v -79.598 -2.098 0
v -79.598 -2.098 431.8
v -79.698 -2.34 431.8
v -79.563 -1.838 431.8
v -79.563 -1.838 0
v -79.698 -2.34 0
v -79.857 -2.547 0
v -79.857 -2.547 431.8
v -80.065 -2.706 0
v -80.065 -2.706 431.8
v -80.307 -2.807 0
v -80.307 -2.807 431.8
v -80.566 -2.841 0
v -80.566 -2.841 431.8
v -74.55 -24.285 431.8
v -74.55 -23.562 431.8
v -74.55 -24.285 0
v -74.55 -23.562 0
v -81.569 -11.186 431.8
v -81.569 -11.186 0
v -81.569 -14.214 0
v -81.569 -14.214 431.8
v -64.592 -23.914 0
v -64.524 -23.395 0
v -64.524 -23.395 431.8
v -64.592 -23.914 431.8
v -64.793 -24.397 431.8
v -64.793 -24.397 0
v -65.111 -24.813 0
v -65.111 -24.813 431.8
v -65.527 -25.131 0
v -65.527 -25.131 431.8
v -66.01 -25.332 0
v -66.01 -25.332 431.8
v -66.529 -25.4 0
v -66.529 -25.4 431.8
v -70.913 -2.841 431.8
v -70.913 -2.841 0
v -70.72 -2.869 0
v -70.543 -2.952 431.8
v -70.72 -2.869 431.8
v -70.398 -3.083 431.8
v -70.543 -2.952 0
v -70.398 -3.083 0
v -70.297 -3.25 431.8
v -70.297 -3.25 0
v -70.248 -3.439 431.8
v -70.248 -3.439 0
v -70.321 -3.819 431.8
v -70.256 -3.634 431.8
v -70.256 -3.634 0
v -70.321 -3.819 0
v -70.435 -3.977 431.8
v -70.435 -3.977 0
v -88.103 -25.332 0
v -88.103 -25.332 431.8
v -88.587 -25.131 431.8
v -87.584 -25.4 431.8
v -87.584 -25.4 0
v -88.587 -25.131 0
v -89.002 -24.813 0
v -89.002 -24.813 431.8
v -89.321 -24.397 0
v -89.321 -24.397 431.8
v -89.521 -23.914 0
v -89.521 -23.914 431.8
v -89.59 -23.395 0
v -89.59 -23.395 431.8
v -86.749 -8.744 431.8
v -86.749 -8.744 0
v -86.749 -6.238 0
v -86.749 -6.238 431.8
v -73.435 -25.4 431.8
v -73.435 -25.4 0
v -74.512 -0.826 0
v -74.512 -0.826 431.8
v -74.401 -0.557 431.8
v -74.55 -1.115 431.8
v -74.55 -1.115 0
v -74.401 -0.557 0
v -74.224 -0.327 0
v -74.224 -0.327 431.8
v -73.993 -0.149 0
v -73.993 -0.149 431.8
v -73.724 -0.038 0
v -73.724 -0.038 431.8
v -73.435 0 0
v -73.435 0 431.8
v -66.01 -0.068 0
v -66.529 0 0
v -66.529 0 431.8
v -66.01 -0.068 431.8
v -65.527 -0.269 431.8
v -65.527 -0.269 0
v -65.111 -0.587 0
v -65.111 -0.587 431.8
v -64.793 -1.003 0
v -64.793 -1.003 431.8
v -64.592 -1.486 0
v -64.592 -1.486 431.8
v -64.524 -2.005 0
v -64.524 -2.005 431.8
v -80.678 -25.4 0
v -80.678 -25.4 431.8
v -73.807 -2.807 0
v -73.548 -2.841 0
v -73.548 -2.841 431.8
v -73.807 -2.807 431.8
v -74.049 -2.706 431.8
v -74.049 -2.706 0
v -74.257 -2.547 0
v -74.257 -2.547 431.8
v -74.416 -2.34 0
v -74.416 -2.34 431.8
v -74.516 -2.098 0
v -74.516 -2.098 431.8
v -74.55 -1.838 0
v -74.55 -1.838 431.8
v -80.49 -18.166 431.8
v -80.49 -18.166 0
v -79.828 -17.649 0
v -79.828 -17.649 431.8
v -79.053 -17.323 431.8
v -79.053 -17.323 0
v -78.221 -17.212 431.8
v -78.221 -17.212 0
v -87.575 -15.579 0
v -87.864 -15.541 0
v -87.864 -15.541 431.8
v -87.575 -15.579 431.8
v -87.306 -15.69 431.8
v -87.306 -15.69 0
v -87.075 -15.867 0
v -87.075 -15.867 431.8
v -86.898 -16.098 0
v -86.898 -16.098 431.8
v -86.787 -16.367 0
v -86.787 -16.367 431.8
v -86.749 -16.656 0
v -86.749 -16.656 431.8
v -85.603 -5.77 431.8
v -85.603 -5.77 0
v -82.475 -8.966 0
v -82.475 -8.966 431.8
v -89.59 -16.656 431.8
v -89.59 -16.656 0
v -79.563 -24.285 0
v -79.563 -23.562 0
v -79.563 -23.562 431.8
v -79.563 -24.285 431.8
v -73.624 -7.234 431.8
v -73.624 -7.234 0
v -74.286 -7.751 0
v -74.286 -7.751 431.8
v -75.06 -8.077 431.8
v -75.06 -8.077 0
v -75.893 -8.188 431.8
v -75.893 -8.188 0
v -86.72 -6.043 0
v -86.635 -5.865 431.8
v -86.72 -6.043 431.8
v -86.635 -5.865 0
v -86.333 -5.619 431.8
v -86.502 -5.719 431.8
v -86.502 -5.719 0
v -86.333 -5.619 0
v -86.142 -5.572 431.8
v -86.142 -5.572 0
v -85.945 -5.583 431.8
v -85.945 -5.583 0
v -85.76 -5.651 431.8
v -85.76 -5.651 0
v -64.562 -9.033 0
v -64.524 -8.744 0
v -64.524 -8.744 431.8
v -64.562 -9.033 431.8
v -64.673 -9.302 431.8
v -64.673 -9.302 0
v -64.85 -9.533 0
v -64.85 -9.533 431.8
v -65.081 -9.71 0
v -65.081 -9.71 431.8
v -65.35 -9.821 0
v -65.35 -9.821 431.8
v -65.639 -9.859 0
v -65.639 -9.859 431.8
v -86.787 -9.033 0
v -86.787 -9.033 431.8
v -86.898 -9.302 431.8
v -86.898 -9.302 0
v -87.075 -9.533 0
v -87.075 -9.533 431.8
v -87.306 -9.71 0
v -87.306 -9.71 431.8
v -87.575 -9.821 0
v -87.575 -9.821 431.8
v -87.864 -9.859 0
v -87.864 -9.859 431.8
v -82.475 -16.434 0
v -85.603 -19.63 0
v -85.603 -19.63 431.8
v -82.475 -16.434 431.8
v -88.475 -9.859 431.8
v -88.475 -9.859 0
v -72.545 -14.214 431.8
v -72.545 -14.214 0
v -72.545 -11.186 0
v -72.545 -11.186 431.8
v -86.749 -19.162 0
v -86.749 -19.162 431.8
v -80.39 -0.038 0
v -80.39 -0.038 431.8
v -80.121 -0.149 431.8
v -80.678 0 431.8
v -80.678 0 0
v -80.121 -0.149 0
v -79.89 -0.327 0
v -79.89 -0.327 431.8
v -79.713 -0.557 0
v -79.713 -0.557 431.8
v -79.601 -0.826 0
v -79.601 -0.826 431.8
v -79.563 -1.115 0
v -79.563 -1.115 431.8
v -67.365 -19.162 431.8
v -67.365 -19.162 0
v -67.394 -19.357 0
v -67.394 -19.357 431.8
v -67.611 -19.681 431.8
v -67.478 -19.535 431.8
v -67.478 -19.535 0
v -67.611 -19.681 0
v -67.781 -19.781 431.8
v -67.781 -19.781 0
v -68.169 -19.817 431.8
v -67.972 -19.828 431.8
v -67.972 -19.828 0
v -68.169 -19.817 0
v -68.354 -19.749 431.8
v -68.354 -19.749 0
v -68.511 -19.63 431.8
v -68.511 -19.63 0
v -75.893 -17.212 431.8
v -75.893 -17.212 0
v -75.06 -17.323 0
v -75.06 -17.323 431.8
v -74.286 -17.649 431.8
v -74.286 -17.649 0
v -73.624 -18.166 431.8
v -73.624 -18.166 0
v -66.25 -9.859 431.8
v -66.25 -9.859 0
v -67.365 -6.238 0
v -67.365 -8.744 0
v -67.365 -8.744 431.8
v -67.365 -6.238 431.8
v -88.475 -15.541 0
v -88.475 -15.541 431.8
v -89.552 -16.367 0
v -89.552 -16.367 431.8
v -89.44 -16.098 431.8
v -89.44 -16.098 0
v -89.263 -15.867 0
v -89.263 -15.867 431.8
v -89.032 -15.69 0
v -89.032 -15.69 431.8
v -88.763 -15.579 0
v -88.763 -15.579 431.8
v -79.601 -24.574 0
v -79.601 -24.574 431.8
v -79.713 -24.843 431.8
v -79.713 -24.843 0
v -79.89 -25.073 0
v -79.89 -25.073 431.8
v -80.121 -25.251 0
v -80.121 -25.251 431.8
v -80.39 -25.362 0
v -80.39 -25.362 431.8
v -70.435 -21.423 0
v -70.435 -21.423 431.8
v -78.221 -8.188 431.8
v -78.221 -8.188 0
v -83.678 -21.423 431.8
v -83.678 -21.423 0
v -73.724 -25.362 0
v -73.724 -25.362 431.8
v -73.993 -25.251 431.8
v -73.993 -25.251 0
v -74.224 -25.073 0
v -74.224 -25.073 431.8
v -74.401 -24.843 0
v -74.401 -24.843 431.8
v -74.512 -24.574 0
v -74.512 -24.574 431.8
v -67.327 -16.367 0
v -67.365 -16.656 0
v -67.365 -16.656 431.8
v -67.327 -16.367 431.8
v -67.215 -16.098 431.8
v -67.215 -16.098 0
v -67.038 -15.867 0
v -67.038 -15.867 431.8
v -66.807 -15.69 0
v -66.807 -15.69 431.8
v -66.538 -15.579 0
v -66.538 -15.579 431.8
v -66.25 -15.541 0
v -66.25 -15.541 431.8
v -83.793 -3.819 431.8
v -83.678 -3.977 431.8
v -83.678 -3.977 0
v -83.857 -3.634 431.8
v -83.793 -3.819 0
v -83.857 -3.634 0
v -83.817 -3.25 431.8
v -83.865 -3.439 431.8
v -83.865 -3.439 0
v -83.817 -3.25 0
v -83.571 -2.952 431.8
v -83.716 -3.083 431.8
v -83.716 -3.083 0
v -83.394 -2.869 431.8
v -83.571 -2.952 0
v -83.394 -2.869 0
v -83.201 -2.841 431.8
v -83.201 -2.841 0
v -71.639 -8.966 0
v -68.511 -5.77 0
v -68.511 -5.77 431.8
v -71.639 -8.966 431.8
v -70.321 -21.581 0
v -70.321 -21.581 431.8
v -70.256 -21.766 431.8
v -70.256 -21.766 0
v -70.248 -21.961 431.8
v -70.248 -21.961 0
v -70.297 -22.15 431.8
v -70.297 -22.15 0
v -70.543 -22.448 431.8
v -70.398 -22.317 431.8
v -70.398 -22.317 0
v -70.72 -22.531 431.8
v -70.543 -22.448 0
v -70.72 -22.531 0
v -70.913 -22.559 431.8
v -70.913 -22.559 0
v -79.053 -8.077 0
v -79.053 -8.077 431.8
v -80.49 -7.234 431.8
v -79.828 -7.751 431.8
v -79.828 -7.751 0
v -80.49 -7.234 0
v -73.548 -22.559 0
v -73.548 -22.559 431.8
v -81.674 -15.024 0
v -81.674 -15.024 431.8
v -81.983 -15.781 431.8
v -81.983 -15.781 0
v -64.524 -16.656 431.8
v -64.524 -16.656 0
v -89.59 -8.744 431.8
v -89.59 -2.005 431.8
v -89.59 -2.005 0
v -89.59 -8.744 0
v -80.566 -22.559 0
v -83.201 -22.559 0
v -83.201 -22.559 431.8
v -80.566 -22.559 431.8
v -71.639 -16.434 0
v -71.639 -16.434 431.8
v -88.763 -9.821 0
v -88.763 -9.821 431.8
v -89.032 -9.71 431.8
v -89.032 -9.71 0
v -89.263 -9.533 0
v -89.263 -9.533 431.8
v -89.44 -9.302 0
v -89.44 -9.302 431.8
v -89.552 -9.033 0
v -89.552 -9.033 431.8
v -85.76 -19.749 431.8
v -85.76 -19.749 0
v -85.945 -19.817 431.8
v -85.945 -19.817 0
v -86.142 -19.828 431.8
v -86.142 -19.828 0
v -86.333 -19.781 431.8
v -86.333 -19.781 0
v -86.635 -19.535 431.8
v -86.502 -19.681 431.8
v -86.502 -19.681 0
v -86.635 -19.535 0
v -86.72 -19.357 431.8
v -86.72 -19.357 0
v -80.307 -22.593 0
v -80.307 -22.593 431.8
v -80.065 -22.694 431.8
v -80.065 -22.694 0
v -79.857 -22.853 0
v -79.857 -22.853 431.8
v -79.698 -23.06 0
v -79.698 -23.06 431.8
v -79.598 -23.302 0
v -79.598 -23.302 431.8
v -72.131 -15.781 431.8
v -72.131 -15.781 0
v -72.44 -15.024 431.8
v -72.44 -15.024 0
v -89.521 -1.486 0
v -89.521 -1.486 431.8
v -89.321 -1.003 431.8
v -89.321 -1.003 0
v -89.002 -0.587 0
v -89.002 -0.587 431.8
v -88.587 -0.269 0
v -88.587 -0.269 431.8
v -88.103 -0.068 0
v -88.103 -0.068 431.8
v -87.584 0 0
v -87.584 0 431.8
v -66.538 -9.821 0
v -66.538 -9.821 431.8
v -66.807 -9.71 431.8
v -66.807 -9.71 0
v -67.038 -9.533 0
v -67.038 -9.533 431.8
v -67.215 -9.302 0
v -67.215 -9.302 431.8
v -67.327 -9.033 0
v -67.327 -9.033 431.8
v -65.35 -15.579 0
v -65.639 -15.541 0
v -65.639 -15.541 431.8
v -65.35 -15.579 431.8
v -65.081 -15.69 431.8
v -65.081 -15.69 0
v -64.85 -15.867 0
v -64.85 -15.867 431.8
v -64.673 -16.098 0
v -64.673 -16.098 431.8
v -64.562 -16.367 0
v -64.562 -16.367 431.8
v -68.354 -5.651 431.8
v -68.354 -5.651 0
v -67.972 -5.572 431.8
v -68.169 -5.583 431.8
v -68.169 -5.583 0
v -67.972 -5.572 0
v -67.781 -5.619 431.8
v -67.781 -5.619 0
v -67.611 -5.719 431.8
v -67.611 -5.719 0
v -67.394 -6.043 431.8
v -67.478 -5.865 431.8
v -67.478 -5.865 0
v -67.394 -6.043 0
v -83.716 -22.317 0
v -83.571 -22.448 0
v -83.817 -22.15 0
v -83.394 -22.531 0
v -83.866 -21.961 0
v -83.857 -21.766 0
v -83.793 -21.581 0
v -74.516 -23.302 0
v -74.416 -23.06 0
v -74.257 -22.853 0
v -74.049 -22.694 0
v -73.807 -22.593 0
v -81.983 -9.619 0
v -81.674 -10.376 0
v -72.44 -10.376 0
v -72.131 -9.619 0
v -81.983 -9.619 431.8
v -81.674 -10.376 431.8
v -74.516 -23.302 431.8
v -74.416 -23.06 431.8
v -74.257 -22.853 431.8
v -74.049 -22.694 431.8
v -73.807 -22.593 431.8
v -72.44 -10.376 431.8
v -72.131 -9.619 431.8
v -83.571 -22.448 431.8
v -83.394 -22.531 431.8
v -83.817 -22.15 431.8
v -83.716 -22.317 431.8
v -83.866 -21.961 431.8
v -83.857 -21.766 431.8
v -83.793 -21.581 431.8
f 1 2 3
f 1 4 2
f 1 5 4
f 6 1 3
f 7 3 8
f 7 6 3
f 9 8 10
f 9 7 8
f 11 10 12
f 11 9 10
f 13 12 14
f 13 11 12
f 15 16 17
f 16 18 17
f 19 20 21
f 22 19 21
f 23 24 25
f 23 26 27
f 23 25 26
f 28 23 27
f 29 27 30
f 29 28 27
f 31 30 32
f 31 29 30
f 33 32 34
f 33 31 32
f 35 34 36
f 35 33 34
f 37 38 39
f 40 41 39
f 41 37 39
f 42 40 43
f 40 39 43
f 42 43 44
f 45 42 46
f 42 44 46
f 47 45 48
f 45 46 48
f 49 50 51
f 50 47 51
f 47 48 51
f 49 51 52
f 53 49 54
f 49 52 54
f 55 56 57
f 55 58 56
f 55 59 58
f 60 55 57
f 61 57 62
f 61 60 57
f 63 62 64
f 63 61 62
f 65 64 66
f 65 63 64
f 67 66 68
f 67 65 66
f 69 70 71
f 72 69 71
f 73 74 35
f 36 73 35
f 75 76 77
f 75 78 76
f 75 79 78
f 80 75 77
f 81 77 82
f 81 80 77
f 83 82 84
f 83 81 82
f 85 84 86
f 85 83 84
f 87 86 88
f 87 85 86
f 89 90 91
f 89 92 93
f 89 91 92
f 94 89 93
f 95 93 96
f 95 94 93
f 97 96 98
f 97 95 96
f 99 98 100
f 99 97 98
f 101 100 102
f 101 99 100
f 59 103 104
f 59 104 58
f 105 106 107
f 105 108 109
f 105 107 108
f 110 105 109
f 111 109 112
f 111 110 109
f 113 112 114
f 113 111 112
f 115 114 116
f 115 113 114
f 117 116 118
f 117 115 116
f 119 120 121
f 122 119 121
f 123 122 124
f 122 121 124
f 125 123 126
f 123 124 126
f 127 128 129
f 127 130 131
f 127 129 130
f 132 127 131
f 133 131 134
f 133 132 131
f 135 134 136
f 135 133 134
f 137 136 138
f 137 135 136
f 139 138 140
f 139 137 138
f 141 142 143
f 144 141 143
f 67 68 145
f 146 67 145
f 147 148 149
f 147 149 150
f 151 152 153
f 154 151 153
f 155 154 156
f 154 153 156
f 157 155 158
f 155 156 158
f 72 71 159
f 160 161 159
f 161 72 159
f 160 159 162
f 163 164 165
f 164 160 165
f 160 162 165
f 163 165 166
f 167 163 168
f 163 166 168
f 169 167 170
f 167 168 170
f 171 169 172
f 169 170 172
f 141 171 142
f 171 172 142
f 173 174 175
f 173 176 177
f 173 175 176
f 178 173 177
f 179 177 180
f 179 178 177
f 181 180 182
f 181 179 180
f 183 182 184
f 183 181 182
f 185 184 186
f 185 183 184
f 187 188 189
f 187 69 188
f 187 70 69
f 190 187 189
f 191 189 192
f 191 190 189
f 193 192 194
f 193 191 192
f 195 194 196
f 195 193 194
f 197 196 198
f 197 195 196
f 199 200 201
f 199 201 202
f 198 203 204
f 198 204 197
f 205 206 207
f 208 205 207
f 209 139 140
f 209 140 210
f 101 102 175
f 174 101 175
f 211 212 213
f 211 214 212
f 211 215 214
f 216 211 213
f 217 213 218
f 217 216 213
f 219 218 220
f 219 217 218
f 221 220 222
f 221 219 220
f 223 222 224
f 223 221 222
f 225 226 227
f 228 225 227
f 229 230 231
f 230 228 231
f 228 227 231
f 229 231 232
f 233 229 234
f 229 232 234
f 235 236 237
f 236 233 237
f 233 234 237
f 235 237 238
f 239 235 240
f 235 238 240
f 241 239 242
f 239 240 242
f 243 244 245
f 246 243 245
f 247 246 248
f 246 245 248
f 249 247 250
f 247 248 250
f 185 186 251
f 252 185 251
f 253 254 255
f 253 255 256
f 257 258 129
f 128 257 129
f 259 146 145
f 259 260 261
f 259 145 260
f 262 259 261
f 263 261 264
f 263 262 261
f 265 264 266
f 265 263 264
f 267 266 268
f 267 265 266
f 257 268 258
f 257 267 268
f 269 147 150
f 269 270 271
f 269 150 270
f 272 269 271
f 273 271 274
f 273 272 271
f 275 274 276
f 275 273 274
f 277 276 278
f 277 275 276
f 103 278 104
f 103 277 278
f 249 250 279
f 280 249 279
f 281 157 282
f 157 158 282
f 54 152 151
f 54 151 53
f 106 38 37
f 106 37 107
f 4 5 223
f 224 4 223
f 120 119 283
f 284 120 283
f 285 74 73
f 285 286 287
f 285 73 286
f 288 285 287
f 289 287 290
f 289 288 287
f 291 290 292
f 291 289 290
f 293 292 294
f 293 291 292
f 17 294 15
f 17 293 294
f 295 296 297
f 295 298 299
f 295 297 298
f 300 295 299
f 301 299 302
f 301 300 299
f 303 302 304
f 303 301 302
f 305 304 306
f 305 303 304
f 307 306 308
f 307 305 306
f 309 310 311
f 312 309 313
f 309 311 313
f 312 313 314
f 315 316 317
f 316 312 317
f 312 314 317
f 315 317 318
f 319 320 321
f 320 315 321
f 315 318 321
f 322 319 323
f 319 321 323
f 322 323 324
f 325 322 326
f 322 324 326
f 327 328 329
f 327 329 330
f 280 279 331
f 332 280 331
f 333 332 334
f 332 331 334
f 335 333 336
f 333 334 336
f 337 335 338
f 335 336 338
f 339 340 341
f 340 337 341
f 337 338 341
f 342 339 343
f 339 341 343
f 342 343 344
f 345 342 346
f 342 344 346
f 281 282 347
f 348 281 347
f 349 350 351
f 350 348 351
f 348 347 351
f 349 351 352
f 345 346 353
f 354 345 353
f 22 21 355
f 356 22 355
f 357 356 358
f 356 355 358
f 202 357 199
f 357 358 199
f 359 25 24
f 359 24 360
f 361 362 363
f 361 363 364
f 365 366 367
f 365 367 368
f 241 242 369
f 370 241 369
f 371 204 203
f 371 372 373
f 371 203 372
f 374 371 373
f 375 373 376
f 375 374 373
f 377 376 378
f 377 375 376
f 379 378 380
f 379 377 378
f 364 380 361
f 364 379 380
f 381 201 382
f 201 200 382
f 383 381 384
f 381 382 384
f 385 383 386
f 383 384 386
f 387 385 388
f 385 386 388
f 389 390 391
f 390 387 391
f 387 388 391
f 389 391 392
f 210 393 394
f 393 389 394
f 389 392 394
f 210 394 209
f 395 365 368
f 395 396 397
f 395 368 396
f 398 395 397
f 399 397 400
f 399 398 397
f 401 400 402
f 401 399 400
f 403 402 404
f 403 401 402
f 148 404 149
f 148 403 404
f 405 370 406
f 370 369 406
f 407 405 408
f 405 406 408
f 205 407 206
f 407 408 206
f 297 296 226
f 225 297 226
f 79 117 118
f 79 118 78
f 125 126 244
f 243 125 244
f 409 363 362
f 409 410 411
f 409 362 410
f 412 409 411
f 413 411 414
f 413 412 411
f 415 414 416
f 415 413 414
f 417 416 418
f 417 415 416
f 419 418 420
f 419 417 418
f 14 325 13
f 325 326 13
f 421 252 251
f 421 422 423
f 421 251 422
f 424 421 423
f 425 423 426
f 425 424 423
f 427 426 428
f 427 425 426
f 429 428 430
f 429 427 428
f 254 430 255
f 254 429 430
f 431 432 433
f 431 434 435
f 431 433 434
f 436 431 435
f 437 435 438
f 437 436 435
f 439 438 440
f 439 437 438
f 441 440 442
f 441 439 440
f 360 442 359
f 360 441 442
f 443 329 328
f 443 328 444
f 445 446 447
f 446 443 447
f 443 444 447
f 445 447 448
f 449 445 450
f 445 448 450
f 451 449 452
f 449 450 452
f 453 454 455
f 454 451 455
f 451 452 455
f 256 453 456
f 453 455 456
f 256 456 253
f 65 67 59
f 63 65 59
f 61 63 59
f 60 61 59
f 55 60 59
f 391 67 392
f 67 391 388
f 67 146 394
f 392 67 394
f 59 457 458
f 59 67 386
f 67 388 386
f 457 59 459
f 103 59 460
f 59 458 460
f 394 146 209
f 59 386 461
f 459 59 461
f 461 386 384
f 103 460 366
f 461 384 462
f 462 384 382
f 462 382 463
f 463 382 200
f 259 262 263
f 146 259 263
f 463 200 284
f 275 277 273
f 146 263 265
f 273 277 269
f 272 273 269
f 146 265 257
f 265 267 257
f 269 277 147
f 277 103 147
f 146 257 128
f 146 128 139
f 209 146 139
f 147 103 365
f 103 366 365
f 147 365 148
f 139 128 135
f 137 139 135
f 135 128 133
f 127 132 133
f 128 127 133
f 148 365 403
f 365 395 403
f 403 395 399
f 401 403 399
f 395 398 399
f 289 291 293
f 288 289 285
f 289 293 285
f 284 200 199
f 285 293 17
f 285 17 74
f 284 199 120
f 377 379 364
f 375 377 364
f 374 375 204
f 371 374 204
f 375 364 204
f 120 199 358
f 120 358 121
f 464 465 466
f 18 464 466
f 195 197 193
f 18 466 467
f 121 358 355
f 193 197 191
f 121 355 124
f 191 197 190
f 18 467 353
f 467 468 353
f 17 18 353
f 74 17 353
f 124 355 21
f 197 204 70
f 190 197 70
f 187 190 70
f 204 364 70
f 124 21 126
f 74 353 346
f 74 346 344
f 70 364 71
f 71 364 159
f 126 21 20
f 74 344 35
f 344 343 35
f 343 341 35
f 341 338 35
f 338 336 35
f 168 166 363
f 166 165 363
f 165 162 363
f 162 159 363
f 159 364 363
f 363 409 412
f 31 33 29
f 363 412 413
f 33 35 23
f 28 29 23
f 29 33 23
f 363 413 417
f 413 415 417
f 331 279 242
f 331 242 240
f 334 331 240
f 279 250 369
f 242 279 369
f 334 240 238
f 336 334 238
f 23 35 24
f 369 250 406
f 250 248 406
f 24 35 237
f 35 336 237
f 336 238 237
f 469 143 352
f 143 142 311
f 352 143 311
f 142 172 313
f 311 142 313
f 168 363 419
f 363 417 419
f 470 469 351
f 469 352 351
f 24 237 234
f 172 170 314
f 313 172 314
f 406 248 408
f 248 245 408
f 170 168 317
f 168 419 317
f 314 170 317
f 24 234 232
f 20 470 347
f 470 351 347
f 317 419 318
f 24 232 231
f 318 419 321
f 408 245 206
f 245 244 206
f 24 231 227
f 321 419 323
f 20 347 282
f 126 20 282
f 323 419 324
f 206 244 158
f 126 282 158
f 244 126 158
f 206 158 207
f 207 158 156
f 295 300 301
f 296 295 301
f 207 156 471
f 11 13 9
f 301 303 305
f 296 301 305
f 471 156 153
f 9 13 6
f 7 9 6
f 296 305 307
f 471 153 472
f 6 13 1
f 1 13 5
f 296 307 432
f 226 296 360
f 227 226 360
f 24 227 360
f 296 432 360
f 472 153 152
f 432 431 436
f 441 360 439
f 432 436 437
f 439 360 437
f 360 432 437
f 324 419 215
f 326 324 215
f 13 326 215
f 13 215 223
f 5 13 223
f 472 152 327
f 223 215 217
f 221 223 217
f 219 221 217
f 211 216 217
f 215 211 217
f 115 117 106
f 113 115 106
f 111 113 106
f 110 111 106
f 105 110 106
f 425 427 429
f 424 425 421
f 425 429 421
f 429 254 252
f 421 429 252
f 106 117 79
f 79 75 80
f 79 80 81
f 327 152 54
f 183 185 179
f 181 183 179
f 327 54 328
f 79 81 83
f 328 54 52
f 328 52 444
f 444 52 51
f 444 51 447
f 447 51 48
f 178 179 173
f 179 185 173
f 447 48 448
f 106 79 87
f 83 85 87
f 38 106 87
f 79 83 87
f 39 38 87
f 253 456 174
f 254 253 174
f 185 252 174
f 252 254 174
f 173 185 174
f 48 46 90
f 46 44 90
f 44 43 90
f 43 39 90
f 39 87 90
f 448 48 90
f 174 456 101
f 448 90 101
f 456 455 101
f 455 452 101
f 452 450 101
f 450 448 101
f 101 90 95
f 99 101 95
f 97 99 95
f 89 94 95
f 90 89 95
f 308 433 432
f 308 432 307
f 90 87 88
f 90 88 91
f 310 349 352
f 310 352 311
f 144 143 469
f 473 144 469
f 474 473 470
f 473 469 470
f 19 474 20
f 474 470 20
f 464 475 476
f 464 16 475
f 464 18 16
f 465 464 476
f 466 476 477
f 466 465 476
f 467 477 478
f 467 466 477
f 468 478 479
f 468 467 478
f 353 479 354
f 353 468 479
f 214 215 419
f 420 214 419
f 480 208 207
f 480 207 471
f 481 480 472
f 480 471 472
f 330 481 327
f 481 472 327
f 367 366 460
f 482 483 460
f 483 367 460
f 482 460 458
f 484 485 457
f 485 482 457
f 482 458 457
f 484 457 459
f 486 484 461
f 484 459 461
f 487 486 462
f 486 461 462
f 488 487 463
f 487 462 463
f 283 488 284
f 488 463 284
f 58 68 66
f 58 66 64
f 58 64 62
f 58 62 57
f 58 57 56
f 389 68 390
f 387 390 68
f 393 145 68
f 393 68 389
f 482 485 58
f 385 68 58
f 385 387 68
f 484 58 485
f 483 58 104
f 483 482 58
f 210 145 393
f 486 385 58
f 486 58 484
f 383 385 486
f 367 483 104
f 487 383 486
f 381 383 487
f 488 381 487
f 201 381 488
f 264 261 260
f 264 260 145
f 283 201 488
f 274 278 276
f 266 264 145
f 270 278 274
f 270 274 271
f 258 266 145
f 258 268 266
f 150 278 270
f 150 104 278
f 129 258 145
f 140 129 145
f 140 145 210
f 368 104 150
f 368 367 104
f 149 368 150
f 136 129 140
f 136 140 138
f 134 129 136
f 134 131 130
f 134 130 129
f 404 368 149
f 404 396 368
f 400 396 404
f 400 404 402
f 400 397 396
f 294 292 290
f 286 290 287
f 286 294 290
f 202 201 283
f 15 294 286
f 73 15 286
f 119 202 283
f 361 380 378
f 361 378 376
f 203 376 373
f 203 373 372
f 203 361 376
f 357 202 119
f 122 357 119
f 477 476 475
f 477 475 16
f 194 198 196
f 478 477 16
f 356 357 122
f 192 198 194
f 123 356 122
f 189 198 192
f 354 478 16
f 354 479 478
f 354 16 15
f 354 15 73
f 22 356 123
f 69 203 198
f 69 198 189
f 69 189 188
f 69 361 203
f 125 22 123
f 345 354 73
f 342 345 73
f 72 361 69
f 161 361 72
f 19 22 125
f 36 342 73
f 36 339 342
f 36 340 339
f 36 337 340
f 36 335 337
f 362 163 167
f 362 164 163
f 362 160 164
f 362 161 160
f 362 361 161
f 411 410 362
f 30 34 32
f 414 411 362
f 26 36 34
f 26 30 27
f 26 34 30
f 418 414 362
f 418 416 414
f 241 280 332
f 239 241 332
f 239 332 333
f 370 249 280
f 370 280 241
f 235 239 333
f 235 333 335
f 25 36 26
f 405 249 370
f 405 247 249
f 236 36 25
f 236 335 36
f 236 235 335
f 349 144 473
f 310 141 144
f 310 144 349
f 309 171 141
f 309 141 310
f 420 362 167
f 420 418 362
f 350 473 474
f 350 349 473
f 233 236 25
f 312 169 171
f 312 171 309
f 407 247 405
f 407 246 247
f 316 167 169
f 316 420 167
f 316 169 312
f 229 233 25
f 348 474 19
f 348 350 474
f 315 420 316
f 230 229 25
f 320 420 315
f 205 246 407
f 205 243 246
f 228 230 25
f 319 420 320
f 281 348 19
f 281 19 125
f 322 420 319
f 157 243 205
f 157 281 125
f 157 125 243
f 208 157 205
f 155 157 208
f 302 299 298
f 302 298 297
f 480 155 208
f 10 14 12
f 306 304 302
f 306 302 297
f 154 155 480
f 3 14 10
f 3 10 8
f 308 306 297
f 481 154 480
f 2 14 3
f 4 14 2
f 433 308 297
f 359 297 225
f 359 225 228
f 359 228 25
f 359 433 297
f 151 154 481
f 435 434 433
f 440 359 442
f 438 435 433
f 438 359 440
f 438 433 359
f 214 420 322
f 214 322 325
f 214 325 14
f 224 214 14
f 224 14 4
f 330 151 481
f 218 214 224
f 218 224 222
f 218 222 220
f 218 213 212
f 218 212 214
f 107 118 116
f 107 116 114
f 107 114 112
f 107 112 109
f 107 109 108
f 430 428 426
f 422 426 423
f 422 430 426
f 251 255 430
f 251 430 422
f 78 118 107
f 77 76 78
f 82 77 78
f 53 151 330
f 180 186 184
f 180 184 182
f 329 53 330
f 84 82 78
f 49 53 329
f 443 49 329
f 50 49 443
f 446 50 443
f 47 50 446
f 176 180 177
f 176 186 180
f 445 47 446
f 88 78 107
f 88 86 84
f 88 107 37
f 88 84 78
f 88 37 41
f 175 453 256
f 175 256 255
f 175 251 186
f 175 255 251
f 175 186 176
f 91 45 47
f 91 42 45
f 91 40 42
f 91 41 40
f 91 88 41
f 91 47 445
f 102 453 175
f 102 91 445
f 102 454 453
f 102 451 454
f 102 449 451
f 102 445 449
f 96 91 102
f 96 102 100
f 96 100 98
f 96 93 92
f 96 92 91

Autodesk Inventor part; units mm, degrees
ref_plane "YZ Plane" through (0, 0, 0) normal (1, 0, 0) x (0, 1, 0)
ref_plane "XZ Plane" through (0, 0, 0) normal (0, 1, 0) x (-1, 0, 0)
ref_plane "XY Plane" through (0, 0, 0) normal (0, 0, 1) x (1, 0, 0)
ref_plane "Work Plane1" through (-89.5775, 0, 0) normal (0, 0, 1) x (1, 0, 0)
sketch "Sketch1" plane through (-89.5775, 0, 0) normal (0, 0, 1) x (1, 0, 0)
  arc A0 (19.1422, -3.9768) -> (18.6646, -2.8408) centre (18.6646, -3.5092) ccw
  line L0 (15.9535, -7.2342) -> (19.1422, -3.9768)
  line L1 (21.0667, -5.7702) -> (17.9387, -8.9655)
  arc A1 (22.2128, -6.2377) -> (21.0667, -5.7702) centre (21.5444, -6.2377) ccw
  line L2 (25.0536, -2.0053) -> (25.0536, -8.7443)
  line L3 (22.2128, -8.7443) -> (22.2128, -6.2377)
  line L4 (-0.0122, -2.0053) -> (-0.0122, -8.7443)
  arc A2 (3.9747, -5.7702) -> (2.8286, -6.2377) centre (3.497, -6.2377) ccw
  arc A3 (1.9931, 0) -> (-0.0122, -2.0053) centre (1.9931, -2.0053) ccw
  line L5 (8.8992, 0) -> (1.9931, 0)
  arc A4 (7.1027, -16.4345) -> (8.0089, -14.2135) centre (4.8339, -14.2135) ccw
  arc A5 (18.6646, -22.5592) -> (19.1422, -21.4232) centre (18.6646, -21.8908) ccw
  line L6 (15.9535, -18.1658) -> (19.1422, -21.4232)
  arc A6 (21.0667, -19.6298) -> (22.2128, -19.1623) centre (21.5444, -19.1623) ccw
  line L7 (21.0667, -19.6298) -> (17.9387, -16.4345)
  line L8 (22.2128, -16.6557) -> (22.2128, -19.1623)
  line L9 (25.0536, -23.3947) -> (25.0536, -16.6557)
  line L10 (16.1422, 0) -> (23.0483, 0)
  line L11 (18.6646, -2.8408) -> (16.0299, -2.8408)
  arc A7 (22.2128, -8.7443) -> (23.3277, -9.8592) centre (23.3277, -8.7443) ccw
  line L12 (23.9387, -9.8592) -> (23.3277, -9.8592)
  arc A8 (23.9387, -9.8592) -> (25.0536, -8.7443) centre (23.9387, -8.7443) ccw
  arc A9 (6.3768, -2.8408) -> (5.8991, -3.9768) centre (6.3768, -3.5092) ccw
  line L13 (3.9747, -5.7702) -> (7.1027, -8.9655)
  line L14 (9.0879, -7.2342) -> (5.8991, -3.9768)
  arc A10 (2.8286, -19.1623) -> (3.9747, -19.6298) centre (3.497, -19.1623) ccw
  line L15 (-0.0122, -23.3947) -> (-0.0122, -16.6557)
  line L16 (3.9747, -19.6298) -> (7.1027, -16.4345)
  arc A11 (5.8991, -21.4232) -> (6.3768, -22.5592) centre (6.3768, -21.8908) ccw
  line L17 (9.0879, -18.1658) -> (5.8991, -21.4232)
  line L18 (2.8286, -16.6557) -> (2.8286, -19.1623)
  arc A12 (23.0483, -25.4) -> (25.0536, -23.3947) centre (23.0483, -23.3947) ccw
  arc A13 (25.0536, -2.0053) -> (23.0483, 0) centre (23.0483, -2.0053) ccw
  arc A14 (13.6846, -8.1882) -> (15.9535, -7.2342) centre (13.6846, -5.0132) ccw
  line L19 (13.6846, -8.1882) -> (11.3567, -8.1882)
  arc A15 (9.0115, -2.8408) -> (10.0141, -1.8382) centre (9.0115, -1.8382) ccw
  arc A16 (9.0879, -7.2342) -> (11.3567, -8.1882) centre (11.3567, -5.0132) ccw
  arc A17 (17.9387, -8.9655) -> (17.0325, -11.1865) centre (20.2075, -11.1865) ccw
  line L20 (17.0325, -14.2135) -> (17.0325, -11.1865)
  line L21 (6.3768, -2.8408) -> (9.0115, -2.8408)
  line L22 (10.0141, -1.8382) -> (10.0141, -1.1149)
  arc A18 (10.0141, -1.1149) -> (8.8992, 0) centre (8.8992, -1.1149) ccw
  line L23 (2.8286, -8.7443) -> (2.8286, -6.2377)
  arc A19 (1.7137, -9.8592) -> (2.8286, -8.7443) centre (1.7137, -8.7443) ccw
  line L24 (1.1027, -9.8592) -> (1.7137, -9.8592)
  arc A20 (-0.0122, -8.7443) -> (1.1027, -9.8592) centre (1.1027, -8.7443) ccw
  line L25 (6.3768, -22.5592) -> (9.0115, -22.5592)
  arc A21 (10.0141, -23.5618) -> (9.0115, -22.5592) centre (9.0115, -23.5618) ccw
  line L26 (10.0141, -23.5618) -> (10.0141, -24.2851)
  arc A22 (8.8992, -25.4) -> (10.0141, -24.2851) centre (8.8992, -24.2851) ccw
  line L27 (8.8992, -25.4) -> (1.9931, -25.4)
  arc A23 (17.0325, -14.2135) -> (17.9387, -16.4345) centre (20.2075, -14.2135) ccw
  line L28 (23.9387, -15.5408) -> (23.3277, -15.5408)
  arc A24 (23.3277, -15.5408) -> (22.2128, -16.6557) centre (23.3277, -16.6557) ccw
  arc A25 (25.0536, -16.6557) -> (23.9387, -15.5408) centre (23.9387, -16.6557) ccw
  line L29 (16.1422, -25.4) -> (23.0483, -25.4)
  line L30 (18.6646, -22.5592) -> (16.0299, -22.5592)
  line L31 (8.0089, -11.1865) -> (8.0089, -14.2135)
  arc A26 (8.0089, -11.1865) -> (7.1027, -8.9655) centre (4.8339, -11.1865) ccw
  arc A27 (15.0273, -1.8382) -> (16.0299, -2.8408) centre (16.0299, -1.8382) ccw
  line L32 (15.0273, -1.8382) -> (15.0273, -1.1149)
  arc A28 (16.1422, 0) -> (15.0273, -1.1149) centre (16.1422, -1.1149) ccw
  arc A29 (-0.0122, -23.3947) -> (1.9931, -25.4) centre (1.9931, -23.3947) ccw
  arc A30 (11.3567, -17.2118) -> (9.0879, -18.1658) centre (11.3567, -20.3868) ccw
  line L33 (11.3567, -17.2118) -> (13.6846, -17.2118)
  arc A31 (15.9535, -18.1658) -> (13.6846, -17.2118) centre (13.6846, -20.3868) ccw
  arc A32 (16.0299, -22.5592) -> (15.0273, -23.5618) centre (16.0299, -23.5618) ccw
  line L34 (15.0273, -23.5618) -> (15.0273, -24.2851)
  arc A33 (15.0273, -24.2851) -> (16.1422, -25.4) centre (16.1422, -24.2851) ccw
  line L35 (1.1027, -15.5408) -> (1.7137, -15.5408)
  arc A34 (1.1027, -15.5408) -> (-0.0122, -16.6557) centre (1.1027, -16.6557) ccw
  arc A35 (2.8286, -16.6557) -> (1.7137, -15.5408) centre (1.7137, -16.6557) ccw
  point P0 (89.5775, 0)
  point P1 (12.5207, -12.7)
  dimension "d0" = 25.4
extrude "Extrusion1" add sketch "Sketch1" along normal blind 431.8
properties part number "extruded vertical"
